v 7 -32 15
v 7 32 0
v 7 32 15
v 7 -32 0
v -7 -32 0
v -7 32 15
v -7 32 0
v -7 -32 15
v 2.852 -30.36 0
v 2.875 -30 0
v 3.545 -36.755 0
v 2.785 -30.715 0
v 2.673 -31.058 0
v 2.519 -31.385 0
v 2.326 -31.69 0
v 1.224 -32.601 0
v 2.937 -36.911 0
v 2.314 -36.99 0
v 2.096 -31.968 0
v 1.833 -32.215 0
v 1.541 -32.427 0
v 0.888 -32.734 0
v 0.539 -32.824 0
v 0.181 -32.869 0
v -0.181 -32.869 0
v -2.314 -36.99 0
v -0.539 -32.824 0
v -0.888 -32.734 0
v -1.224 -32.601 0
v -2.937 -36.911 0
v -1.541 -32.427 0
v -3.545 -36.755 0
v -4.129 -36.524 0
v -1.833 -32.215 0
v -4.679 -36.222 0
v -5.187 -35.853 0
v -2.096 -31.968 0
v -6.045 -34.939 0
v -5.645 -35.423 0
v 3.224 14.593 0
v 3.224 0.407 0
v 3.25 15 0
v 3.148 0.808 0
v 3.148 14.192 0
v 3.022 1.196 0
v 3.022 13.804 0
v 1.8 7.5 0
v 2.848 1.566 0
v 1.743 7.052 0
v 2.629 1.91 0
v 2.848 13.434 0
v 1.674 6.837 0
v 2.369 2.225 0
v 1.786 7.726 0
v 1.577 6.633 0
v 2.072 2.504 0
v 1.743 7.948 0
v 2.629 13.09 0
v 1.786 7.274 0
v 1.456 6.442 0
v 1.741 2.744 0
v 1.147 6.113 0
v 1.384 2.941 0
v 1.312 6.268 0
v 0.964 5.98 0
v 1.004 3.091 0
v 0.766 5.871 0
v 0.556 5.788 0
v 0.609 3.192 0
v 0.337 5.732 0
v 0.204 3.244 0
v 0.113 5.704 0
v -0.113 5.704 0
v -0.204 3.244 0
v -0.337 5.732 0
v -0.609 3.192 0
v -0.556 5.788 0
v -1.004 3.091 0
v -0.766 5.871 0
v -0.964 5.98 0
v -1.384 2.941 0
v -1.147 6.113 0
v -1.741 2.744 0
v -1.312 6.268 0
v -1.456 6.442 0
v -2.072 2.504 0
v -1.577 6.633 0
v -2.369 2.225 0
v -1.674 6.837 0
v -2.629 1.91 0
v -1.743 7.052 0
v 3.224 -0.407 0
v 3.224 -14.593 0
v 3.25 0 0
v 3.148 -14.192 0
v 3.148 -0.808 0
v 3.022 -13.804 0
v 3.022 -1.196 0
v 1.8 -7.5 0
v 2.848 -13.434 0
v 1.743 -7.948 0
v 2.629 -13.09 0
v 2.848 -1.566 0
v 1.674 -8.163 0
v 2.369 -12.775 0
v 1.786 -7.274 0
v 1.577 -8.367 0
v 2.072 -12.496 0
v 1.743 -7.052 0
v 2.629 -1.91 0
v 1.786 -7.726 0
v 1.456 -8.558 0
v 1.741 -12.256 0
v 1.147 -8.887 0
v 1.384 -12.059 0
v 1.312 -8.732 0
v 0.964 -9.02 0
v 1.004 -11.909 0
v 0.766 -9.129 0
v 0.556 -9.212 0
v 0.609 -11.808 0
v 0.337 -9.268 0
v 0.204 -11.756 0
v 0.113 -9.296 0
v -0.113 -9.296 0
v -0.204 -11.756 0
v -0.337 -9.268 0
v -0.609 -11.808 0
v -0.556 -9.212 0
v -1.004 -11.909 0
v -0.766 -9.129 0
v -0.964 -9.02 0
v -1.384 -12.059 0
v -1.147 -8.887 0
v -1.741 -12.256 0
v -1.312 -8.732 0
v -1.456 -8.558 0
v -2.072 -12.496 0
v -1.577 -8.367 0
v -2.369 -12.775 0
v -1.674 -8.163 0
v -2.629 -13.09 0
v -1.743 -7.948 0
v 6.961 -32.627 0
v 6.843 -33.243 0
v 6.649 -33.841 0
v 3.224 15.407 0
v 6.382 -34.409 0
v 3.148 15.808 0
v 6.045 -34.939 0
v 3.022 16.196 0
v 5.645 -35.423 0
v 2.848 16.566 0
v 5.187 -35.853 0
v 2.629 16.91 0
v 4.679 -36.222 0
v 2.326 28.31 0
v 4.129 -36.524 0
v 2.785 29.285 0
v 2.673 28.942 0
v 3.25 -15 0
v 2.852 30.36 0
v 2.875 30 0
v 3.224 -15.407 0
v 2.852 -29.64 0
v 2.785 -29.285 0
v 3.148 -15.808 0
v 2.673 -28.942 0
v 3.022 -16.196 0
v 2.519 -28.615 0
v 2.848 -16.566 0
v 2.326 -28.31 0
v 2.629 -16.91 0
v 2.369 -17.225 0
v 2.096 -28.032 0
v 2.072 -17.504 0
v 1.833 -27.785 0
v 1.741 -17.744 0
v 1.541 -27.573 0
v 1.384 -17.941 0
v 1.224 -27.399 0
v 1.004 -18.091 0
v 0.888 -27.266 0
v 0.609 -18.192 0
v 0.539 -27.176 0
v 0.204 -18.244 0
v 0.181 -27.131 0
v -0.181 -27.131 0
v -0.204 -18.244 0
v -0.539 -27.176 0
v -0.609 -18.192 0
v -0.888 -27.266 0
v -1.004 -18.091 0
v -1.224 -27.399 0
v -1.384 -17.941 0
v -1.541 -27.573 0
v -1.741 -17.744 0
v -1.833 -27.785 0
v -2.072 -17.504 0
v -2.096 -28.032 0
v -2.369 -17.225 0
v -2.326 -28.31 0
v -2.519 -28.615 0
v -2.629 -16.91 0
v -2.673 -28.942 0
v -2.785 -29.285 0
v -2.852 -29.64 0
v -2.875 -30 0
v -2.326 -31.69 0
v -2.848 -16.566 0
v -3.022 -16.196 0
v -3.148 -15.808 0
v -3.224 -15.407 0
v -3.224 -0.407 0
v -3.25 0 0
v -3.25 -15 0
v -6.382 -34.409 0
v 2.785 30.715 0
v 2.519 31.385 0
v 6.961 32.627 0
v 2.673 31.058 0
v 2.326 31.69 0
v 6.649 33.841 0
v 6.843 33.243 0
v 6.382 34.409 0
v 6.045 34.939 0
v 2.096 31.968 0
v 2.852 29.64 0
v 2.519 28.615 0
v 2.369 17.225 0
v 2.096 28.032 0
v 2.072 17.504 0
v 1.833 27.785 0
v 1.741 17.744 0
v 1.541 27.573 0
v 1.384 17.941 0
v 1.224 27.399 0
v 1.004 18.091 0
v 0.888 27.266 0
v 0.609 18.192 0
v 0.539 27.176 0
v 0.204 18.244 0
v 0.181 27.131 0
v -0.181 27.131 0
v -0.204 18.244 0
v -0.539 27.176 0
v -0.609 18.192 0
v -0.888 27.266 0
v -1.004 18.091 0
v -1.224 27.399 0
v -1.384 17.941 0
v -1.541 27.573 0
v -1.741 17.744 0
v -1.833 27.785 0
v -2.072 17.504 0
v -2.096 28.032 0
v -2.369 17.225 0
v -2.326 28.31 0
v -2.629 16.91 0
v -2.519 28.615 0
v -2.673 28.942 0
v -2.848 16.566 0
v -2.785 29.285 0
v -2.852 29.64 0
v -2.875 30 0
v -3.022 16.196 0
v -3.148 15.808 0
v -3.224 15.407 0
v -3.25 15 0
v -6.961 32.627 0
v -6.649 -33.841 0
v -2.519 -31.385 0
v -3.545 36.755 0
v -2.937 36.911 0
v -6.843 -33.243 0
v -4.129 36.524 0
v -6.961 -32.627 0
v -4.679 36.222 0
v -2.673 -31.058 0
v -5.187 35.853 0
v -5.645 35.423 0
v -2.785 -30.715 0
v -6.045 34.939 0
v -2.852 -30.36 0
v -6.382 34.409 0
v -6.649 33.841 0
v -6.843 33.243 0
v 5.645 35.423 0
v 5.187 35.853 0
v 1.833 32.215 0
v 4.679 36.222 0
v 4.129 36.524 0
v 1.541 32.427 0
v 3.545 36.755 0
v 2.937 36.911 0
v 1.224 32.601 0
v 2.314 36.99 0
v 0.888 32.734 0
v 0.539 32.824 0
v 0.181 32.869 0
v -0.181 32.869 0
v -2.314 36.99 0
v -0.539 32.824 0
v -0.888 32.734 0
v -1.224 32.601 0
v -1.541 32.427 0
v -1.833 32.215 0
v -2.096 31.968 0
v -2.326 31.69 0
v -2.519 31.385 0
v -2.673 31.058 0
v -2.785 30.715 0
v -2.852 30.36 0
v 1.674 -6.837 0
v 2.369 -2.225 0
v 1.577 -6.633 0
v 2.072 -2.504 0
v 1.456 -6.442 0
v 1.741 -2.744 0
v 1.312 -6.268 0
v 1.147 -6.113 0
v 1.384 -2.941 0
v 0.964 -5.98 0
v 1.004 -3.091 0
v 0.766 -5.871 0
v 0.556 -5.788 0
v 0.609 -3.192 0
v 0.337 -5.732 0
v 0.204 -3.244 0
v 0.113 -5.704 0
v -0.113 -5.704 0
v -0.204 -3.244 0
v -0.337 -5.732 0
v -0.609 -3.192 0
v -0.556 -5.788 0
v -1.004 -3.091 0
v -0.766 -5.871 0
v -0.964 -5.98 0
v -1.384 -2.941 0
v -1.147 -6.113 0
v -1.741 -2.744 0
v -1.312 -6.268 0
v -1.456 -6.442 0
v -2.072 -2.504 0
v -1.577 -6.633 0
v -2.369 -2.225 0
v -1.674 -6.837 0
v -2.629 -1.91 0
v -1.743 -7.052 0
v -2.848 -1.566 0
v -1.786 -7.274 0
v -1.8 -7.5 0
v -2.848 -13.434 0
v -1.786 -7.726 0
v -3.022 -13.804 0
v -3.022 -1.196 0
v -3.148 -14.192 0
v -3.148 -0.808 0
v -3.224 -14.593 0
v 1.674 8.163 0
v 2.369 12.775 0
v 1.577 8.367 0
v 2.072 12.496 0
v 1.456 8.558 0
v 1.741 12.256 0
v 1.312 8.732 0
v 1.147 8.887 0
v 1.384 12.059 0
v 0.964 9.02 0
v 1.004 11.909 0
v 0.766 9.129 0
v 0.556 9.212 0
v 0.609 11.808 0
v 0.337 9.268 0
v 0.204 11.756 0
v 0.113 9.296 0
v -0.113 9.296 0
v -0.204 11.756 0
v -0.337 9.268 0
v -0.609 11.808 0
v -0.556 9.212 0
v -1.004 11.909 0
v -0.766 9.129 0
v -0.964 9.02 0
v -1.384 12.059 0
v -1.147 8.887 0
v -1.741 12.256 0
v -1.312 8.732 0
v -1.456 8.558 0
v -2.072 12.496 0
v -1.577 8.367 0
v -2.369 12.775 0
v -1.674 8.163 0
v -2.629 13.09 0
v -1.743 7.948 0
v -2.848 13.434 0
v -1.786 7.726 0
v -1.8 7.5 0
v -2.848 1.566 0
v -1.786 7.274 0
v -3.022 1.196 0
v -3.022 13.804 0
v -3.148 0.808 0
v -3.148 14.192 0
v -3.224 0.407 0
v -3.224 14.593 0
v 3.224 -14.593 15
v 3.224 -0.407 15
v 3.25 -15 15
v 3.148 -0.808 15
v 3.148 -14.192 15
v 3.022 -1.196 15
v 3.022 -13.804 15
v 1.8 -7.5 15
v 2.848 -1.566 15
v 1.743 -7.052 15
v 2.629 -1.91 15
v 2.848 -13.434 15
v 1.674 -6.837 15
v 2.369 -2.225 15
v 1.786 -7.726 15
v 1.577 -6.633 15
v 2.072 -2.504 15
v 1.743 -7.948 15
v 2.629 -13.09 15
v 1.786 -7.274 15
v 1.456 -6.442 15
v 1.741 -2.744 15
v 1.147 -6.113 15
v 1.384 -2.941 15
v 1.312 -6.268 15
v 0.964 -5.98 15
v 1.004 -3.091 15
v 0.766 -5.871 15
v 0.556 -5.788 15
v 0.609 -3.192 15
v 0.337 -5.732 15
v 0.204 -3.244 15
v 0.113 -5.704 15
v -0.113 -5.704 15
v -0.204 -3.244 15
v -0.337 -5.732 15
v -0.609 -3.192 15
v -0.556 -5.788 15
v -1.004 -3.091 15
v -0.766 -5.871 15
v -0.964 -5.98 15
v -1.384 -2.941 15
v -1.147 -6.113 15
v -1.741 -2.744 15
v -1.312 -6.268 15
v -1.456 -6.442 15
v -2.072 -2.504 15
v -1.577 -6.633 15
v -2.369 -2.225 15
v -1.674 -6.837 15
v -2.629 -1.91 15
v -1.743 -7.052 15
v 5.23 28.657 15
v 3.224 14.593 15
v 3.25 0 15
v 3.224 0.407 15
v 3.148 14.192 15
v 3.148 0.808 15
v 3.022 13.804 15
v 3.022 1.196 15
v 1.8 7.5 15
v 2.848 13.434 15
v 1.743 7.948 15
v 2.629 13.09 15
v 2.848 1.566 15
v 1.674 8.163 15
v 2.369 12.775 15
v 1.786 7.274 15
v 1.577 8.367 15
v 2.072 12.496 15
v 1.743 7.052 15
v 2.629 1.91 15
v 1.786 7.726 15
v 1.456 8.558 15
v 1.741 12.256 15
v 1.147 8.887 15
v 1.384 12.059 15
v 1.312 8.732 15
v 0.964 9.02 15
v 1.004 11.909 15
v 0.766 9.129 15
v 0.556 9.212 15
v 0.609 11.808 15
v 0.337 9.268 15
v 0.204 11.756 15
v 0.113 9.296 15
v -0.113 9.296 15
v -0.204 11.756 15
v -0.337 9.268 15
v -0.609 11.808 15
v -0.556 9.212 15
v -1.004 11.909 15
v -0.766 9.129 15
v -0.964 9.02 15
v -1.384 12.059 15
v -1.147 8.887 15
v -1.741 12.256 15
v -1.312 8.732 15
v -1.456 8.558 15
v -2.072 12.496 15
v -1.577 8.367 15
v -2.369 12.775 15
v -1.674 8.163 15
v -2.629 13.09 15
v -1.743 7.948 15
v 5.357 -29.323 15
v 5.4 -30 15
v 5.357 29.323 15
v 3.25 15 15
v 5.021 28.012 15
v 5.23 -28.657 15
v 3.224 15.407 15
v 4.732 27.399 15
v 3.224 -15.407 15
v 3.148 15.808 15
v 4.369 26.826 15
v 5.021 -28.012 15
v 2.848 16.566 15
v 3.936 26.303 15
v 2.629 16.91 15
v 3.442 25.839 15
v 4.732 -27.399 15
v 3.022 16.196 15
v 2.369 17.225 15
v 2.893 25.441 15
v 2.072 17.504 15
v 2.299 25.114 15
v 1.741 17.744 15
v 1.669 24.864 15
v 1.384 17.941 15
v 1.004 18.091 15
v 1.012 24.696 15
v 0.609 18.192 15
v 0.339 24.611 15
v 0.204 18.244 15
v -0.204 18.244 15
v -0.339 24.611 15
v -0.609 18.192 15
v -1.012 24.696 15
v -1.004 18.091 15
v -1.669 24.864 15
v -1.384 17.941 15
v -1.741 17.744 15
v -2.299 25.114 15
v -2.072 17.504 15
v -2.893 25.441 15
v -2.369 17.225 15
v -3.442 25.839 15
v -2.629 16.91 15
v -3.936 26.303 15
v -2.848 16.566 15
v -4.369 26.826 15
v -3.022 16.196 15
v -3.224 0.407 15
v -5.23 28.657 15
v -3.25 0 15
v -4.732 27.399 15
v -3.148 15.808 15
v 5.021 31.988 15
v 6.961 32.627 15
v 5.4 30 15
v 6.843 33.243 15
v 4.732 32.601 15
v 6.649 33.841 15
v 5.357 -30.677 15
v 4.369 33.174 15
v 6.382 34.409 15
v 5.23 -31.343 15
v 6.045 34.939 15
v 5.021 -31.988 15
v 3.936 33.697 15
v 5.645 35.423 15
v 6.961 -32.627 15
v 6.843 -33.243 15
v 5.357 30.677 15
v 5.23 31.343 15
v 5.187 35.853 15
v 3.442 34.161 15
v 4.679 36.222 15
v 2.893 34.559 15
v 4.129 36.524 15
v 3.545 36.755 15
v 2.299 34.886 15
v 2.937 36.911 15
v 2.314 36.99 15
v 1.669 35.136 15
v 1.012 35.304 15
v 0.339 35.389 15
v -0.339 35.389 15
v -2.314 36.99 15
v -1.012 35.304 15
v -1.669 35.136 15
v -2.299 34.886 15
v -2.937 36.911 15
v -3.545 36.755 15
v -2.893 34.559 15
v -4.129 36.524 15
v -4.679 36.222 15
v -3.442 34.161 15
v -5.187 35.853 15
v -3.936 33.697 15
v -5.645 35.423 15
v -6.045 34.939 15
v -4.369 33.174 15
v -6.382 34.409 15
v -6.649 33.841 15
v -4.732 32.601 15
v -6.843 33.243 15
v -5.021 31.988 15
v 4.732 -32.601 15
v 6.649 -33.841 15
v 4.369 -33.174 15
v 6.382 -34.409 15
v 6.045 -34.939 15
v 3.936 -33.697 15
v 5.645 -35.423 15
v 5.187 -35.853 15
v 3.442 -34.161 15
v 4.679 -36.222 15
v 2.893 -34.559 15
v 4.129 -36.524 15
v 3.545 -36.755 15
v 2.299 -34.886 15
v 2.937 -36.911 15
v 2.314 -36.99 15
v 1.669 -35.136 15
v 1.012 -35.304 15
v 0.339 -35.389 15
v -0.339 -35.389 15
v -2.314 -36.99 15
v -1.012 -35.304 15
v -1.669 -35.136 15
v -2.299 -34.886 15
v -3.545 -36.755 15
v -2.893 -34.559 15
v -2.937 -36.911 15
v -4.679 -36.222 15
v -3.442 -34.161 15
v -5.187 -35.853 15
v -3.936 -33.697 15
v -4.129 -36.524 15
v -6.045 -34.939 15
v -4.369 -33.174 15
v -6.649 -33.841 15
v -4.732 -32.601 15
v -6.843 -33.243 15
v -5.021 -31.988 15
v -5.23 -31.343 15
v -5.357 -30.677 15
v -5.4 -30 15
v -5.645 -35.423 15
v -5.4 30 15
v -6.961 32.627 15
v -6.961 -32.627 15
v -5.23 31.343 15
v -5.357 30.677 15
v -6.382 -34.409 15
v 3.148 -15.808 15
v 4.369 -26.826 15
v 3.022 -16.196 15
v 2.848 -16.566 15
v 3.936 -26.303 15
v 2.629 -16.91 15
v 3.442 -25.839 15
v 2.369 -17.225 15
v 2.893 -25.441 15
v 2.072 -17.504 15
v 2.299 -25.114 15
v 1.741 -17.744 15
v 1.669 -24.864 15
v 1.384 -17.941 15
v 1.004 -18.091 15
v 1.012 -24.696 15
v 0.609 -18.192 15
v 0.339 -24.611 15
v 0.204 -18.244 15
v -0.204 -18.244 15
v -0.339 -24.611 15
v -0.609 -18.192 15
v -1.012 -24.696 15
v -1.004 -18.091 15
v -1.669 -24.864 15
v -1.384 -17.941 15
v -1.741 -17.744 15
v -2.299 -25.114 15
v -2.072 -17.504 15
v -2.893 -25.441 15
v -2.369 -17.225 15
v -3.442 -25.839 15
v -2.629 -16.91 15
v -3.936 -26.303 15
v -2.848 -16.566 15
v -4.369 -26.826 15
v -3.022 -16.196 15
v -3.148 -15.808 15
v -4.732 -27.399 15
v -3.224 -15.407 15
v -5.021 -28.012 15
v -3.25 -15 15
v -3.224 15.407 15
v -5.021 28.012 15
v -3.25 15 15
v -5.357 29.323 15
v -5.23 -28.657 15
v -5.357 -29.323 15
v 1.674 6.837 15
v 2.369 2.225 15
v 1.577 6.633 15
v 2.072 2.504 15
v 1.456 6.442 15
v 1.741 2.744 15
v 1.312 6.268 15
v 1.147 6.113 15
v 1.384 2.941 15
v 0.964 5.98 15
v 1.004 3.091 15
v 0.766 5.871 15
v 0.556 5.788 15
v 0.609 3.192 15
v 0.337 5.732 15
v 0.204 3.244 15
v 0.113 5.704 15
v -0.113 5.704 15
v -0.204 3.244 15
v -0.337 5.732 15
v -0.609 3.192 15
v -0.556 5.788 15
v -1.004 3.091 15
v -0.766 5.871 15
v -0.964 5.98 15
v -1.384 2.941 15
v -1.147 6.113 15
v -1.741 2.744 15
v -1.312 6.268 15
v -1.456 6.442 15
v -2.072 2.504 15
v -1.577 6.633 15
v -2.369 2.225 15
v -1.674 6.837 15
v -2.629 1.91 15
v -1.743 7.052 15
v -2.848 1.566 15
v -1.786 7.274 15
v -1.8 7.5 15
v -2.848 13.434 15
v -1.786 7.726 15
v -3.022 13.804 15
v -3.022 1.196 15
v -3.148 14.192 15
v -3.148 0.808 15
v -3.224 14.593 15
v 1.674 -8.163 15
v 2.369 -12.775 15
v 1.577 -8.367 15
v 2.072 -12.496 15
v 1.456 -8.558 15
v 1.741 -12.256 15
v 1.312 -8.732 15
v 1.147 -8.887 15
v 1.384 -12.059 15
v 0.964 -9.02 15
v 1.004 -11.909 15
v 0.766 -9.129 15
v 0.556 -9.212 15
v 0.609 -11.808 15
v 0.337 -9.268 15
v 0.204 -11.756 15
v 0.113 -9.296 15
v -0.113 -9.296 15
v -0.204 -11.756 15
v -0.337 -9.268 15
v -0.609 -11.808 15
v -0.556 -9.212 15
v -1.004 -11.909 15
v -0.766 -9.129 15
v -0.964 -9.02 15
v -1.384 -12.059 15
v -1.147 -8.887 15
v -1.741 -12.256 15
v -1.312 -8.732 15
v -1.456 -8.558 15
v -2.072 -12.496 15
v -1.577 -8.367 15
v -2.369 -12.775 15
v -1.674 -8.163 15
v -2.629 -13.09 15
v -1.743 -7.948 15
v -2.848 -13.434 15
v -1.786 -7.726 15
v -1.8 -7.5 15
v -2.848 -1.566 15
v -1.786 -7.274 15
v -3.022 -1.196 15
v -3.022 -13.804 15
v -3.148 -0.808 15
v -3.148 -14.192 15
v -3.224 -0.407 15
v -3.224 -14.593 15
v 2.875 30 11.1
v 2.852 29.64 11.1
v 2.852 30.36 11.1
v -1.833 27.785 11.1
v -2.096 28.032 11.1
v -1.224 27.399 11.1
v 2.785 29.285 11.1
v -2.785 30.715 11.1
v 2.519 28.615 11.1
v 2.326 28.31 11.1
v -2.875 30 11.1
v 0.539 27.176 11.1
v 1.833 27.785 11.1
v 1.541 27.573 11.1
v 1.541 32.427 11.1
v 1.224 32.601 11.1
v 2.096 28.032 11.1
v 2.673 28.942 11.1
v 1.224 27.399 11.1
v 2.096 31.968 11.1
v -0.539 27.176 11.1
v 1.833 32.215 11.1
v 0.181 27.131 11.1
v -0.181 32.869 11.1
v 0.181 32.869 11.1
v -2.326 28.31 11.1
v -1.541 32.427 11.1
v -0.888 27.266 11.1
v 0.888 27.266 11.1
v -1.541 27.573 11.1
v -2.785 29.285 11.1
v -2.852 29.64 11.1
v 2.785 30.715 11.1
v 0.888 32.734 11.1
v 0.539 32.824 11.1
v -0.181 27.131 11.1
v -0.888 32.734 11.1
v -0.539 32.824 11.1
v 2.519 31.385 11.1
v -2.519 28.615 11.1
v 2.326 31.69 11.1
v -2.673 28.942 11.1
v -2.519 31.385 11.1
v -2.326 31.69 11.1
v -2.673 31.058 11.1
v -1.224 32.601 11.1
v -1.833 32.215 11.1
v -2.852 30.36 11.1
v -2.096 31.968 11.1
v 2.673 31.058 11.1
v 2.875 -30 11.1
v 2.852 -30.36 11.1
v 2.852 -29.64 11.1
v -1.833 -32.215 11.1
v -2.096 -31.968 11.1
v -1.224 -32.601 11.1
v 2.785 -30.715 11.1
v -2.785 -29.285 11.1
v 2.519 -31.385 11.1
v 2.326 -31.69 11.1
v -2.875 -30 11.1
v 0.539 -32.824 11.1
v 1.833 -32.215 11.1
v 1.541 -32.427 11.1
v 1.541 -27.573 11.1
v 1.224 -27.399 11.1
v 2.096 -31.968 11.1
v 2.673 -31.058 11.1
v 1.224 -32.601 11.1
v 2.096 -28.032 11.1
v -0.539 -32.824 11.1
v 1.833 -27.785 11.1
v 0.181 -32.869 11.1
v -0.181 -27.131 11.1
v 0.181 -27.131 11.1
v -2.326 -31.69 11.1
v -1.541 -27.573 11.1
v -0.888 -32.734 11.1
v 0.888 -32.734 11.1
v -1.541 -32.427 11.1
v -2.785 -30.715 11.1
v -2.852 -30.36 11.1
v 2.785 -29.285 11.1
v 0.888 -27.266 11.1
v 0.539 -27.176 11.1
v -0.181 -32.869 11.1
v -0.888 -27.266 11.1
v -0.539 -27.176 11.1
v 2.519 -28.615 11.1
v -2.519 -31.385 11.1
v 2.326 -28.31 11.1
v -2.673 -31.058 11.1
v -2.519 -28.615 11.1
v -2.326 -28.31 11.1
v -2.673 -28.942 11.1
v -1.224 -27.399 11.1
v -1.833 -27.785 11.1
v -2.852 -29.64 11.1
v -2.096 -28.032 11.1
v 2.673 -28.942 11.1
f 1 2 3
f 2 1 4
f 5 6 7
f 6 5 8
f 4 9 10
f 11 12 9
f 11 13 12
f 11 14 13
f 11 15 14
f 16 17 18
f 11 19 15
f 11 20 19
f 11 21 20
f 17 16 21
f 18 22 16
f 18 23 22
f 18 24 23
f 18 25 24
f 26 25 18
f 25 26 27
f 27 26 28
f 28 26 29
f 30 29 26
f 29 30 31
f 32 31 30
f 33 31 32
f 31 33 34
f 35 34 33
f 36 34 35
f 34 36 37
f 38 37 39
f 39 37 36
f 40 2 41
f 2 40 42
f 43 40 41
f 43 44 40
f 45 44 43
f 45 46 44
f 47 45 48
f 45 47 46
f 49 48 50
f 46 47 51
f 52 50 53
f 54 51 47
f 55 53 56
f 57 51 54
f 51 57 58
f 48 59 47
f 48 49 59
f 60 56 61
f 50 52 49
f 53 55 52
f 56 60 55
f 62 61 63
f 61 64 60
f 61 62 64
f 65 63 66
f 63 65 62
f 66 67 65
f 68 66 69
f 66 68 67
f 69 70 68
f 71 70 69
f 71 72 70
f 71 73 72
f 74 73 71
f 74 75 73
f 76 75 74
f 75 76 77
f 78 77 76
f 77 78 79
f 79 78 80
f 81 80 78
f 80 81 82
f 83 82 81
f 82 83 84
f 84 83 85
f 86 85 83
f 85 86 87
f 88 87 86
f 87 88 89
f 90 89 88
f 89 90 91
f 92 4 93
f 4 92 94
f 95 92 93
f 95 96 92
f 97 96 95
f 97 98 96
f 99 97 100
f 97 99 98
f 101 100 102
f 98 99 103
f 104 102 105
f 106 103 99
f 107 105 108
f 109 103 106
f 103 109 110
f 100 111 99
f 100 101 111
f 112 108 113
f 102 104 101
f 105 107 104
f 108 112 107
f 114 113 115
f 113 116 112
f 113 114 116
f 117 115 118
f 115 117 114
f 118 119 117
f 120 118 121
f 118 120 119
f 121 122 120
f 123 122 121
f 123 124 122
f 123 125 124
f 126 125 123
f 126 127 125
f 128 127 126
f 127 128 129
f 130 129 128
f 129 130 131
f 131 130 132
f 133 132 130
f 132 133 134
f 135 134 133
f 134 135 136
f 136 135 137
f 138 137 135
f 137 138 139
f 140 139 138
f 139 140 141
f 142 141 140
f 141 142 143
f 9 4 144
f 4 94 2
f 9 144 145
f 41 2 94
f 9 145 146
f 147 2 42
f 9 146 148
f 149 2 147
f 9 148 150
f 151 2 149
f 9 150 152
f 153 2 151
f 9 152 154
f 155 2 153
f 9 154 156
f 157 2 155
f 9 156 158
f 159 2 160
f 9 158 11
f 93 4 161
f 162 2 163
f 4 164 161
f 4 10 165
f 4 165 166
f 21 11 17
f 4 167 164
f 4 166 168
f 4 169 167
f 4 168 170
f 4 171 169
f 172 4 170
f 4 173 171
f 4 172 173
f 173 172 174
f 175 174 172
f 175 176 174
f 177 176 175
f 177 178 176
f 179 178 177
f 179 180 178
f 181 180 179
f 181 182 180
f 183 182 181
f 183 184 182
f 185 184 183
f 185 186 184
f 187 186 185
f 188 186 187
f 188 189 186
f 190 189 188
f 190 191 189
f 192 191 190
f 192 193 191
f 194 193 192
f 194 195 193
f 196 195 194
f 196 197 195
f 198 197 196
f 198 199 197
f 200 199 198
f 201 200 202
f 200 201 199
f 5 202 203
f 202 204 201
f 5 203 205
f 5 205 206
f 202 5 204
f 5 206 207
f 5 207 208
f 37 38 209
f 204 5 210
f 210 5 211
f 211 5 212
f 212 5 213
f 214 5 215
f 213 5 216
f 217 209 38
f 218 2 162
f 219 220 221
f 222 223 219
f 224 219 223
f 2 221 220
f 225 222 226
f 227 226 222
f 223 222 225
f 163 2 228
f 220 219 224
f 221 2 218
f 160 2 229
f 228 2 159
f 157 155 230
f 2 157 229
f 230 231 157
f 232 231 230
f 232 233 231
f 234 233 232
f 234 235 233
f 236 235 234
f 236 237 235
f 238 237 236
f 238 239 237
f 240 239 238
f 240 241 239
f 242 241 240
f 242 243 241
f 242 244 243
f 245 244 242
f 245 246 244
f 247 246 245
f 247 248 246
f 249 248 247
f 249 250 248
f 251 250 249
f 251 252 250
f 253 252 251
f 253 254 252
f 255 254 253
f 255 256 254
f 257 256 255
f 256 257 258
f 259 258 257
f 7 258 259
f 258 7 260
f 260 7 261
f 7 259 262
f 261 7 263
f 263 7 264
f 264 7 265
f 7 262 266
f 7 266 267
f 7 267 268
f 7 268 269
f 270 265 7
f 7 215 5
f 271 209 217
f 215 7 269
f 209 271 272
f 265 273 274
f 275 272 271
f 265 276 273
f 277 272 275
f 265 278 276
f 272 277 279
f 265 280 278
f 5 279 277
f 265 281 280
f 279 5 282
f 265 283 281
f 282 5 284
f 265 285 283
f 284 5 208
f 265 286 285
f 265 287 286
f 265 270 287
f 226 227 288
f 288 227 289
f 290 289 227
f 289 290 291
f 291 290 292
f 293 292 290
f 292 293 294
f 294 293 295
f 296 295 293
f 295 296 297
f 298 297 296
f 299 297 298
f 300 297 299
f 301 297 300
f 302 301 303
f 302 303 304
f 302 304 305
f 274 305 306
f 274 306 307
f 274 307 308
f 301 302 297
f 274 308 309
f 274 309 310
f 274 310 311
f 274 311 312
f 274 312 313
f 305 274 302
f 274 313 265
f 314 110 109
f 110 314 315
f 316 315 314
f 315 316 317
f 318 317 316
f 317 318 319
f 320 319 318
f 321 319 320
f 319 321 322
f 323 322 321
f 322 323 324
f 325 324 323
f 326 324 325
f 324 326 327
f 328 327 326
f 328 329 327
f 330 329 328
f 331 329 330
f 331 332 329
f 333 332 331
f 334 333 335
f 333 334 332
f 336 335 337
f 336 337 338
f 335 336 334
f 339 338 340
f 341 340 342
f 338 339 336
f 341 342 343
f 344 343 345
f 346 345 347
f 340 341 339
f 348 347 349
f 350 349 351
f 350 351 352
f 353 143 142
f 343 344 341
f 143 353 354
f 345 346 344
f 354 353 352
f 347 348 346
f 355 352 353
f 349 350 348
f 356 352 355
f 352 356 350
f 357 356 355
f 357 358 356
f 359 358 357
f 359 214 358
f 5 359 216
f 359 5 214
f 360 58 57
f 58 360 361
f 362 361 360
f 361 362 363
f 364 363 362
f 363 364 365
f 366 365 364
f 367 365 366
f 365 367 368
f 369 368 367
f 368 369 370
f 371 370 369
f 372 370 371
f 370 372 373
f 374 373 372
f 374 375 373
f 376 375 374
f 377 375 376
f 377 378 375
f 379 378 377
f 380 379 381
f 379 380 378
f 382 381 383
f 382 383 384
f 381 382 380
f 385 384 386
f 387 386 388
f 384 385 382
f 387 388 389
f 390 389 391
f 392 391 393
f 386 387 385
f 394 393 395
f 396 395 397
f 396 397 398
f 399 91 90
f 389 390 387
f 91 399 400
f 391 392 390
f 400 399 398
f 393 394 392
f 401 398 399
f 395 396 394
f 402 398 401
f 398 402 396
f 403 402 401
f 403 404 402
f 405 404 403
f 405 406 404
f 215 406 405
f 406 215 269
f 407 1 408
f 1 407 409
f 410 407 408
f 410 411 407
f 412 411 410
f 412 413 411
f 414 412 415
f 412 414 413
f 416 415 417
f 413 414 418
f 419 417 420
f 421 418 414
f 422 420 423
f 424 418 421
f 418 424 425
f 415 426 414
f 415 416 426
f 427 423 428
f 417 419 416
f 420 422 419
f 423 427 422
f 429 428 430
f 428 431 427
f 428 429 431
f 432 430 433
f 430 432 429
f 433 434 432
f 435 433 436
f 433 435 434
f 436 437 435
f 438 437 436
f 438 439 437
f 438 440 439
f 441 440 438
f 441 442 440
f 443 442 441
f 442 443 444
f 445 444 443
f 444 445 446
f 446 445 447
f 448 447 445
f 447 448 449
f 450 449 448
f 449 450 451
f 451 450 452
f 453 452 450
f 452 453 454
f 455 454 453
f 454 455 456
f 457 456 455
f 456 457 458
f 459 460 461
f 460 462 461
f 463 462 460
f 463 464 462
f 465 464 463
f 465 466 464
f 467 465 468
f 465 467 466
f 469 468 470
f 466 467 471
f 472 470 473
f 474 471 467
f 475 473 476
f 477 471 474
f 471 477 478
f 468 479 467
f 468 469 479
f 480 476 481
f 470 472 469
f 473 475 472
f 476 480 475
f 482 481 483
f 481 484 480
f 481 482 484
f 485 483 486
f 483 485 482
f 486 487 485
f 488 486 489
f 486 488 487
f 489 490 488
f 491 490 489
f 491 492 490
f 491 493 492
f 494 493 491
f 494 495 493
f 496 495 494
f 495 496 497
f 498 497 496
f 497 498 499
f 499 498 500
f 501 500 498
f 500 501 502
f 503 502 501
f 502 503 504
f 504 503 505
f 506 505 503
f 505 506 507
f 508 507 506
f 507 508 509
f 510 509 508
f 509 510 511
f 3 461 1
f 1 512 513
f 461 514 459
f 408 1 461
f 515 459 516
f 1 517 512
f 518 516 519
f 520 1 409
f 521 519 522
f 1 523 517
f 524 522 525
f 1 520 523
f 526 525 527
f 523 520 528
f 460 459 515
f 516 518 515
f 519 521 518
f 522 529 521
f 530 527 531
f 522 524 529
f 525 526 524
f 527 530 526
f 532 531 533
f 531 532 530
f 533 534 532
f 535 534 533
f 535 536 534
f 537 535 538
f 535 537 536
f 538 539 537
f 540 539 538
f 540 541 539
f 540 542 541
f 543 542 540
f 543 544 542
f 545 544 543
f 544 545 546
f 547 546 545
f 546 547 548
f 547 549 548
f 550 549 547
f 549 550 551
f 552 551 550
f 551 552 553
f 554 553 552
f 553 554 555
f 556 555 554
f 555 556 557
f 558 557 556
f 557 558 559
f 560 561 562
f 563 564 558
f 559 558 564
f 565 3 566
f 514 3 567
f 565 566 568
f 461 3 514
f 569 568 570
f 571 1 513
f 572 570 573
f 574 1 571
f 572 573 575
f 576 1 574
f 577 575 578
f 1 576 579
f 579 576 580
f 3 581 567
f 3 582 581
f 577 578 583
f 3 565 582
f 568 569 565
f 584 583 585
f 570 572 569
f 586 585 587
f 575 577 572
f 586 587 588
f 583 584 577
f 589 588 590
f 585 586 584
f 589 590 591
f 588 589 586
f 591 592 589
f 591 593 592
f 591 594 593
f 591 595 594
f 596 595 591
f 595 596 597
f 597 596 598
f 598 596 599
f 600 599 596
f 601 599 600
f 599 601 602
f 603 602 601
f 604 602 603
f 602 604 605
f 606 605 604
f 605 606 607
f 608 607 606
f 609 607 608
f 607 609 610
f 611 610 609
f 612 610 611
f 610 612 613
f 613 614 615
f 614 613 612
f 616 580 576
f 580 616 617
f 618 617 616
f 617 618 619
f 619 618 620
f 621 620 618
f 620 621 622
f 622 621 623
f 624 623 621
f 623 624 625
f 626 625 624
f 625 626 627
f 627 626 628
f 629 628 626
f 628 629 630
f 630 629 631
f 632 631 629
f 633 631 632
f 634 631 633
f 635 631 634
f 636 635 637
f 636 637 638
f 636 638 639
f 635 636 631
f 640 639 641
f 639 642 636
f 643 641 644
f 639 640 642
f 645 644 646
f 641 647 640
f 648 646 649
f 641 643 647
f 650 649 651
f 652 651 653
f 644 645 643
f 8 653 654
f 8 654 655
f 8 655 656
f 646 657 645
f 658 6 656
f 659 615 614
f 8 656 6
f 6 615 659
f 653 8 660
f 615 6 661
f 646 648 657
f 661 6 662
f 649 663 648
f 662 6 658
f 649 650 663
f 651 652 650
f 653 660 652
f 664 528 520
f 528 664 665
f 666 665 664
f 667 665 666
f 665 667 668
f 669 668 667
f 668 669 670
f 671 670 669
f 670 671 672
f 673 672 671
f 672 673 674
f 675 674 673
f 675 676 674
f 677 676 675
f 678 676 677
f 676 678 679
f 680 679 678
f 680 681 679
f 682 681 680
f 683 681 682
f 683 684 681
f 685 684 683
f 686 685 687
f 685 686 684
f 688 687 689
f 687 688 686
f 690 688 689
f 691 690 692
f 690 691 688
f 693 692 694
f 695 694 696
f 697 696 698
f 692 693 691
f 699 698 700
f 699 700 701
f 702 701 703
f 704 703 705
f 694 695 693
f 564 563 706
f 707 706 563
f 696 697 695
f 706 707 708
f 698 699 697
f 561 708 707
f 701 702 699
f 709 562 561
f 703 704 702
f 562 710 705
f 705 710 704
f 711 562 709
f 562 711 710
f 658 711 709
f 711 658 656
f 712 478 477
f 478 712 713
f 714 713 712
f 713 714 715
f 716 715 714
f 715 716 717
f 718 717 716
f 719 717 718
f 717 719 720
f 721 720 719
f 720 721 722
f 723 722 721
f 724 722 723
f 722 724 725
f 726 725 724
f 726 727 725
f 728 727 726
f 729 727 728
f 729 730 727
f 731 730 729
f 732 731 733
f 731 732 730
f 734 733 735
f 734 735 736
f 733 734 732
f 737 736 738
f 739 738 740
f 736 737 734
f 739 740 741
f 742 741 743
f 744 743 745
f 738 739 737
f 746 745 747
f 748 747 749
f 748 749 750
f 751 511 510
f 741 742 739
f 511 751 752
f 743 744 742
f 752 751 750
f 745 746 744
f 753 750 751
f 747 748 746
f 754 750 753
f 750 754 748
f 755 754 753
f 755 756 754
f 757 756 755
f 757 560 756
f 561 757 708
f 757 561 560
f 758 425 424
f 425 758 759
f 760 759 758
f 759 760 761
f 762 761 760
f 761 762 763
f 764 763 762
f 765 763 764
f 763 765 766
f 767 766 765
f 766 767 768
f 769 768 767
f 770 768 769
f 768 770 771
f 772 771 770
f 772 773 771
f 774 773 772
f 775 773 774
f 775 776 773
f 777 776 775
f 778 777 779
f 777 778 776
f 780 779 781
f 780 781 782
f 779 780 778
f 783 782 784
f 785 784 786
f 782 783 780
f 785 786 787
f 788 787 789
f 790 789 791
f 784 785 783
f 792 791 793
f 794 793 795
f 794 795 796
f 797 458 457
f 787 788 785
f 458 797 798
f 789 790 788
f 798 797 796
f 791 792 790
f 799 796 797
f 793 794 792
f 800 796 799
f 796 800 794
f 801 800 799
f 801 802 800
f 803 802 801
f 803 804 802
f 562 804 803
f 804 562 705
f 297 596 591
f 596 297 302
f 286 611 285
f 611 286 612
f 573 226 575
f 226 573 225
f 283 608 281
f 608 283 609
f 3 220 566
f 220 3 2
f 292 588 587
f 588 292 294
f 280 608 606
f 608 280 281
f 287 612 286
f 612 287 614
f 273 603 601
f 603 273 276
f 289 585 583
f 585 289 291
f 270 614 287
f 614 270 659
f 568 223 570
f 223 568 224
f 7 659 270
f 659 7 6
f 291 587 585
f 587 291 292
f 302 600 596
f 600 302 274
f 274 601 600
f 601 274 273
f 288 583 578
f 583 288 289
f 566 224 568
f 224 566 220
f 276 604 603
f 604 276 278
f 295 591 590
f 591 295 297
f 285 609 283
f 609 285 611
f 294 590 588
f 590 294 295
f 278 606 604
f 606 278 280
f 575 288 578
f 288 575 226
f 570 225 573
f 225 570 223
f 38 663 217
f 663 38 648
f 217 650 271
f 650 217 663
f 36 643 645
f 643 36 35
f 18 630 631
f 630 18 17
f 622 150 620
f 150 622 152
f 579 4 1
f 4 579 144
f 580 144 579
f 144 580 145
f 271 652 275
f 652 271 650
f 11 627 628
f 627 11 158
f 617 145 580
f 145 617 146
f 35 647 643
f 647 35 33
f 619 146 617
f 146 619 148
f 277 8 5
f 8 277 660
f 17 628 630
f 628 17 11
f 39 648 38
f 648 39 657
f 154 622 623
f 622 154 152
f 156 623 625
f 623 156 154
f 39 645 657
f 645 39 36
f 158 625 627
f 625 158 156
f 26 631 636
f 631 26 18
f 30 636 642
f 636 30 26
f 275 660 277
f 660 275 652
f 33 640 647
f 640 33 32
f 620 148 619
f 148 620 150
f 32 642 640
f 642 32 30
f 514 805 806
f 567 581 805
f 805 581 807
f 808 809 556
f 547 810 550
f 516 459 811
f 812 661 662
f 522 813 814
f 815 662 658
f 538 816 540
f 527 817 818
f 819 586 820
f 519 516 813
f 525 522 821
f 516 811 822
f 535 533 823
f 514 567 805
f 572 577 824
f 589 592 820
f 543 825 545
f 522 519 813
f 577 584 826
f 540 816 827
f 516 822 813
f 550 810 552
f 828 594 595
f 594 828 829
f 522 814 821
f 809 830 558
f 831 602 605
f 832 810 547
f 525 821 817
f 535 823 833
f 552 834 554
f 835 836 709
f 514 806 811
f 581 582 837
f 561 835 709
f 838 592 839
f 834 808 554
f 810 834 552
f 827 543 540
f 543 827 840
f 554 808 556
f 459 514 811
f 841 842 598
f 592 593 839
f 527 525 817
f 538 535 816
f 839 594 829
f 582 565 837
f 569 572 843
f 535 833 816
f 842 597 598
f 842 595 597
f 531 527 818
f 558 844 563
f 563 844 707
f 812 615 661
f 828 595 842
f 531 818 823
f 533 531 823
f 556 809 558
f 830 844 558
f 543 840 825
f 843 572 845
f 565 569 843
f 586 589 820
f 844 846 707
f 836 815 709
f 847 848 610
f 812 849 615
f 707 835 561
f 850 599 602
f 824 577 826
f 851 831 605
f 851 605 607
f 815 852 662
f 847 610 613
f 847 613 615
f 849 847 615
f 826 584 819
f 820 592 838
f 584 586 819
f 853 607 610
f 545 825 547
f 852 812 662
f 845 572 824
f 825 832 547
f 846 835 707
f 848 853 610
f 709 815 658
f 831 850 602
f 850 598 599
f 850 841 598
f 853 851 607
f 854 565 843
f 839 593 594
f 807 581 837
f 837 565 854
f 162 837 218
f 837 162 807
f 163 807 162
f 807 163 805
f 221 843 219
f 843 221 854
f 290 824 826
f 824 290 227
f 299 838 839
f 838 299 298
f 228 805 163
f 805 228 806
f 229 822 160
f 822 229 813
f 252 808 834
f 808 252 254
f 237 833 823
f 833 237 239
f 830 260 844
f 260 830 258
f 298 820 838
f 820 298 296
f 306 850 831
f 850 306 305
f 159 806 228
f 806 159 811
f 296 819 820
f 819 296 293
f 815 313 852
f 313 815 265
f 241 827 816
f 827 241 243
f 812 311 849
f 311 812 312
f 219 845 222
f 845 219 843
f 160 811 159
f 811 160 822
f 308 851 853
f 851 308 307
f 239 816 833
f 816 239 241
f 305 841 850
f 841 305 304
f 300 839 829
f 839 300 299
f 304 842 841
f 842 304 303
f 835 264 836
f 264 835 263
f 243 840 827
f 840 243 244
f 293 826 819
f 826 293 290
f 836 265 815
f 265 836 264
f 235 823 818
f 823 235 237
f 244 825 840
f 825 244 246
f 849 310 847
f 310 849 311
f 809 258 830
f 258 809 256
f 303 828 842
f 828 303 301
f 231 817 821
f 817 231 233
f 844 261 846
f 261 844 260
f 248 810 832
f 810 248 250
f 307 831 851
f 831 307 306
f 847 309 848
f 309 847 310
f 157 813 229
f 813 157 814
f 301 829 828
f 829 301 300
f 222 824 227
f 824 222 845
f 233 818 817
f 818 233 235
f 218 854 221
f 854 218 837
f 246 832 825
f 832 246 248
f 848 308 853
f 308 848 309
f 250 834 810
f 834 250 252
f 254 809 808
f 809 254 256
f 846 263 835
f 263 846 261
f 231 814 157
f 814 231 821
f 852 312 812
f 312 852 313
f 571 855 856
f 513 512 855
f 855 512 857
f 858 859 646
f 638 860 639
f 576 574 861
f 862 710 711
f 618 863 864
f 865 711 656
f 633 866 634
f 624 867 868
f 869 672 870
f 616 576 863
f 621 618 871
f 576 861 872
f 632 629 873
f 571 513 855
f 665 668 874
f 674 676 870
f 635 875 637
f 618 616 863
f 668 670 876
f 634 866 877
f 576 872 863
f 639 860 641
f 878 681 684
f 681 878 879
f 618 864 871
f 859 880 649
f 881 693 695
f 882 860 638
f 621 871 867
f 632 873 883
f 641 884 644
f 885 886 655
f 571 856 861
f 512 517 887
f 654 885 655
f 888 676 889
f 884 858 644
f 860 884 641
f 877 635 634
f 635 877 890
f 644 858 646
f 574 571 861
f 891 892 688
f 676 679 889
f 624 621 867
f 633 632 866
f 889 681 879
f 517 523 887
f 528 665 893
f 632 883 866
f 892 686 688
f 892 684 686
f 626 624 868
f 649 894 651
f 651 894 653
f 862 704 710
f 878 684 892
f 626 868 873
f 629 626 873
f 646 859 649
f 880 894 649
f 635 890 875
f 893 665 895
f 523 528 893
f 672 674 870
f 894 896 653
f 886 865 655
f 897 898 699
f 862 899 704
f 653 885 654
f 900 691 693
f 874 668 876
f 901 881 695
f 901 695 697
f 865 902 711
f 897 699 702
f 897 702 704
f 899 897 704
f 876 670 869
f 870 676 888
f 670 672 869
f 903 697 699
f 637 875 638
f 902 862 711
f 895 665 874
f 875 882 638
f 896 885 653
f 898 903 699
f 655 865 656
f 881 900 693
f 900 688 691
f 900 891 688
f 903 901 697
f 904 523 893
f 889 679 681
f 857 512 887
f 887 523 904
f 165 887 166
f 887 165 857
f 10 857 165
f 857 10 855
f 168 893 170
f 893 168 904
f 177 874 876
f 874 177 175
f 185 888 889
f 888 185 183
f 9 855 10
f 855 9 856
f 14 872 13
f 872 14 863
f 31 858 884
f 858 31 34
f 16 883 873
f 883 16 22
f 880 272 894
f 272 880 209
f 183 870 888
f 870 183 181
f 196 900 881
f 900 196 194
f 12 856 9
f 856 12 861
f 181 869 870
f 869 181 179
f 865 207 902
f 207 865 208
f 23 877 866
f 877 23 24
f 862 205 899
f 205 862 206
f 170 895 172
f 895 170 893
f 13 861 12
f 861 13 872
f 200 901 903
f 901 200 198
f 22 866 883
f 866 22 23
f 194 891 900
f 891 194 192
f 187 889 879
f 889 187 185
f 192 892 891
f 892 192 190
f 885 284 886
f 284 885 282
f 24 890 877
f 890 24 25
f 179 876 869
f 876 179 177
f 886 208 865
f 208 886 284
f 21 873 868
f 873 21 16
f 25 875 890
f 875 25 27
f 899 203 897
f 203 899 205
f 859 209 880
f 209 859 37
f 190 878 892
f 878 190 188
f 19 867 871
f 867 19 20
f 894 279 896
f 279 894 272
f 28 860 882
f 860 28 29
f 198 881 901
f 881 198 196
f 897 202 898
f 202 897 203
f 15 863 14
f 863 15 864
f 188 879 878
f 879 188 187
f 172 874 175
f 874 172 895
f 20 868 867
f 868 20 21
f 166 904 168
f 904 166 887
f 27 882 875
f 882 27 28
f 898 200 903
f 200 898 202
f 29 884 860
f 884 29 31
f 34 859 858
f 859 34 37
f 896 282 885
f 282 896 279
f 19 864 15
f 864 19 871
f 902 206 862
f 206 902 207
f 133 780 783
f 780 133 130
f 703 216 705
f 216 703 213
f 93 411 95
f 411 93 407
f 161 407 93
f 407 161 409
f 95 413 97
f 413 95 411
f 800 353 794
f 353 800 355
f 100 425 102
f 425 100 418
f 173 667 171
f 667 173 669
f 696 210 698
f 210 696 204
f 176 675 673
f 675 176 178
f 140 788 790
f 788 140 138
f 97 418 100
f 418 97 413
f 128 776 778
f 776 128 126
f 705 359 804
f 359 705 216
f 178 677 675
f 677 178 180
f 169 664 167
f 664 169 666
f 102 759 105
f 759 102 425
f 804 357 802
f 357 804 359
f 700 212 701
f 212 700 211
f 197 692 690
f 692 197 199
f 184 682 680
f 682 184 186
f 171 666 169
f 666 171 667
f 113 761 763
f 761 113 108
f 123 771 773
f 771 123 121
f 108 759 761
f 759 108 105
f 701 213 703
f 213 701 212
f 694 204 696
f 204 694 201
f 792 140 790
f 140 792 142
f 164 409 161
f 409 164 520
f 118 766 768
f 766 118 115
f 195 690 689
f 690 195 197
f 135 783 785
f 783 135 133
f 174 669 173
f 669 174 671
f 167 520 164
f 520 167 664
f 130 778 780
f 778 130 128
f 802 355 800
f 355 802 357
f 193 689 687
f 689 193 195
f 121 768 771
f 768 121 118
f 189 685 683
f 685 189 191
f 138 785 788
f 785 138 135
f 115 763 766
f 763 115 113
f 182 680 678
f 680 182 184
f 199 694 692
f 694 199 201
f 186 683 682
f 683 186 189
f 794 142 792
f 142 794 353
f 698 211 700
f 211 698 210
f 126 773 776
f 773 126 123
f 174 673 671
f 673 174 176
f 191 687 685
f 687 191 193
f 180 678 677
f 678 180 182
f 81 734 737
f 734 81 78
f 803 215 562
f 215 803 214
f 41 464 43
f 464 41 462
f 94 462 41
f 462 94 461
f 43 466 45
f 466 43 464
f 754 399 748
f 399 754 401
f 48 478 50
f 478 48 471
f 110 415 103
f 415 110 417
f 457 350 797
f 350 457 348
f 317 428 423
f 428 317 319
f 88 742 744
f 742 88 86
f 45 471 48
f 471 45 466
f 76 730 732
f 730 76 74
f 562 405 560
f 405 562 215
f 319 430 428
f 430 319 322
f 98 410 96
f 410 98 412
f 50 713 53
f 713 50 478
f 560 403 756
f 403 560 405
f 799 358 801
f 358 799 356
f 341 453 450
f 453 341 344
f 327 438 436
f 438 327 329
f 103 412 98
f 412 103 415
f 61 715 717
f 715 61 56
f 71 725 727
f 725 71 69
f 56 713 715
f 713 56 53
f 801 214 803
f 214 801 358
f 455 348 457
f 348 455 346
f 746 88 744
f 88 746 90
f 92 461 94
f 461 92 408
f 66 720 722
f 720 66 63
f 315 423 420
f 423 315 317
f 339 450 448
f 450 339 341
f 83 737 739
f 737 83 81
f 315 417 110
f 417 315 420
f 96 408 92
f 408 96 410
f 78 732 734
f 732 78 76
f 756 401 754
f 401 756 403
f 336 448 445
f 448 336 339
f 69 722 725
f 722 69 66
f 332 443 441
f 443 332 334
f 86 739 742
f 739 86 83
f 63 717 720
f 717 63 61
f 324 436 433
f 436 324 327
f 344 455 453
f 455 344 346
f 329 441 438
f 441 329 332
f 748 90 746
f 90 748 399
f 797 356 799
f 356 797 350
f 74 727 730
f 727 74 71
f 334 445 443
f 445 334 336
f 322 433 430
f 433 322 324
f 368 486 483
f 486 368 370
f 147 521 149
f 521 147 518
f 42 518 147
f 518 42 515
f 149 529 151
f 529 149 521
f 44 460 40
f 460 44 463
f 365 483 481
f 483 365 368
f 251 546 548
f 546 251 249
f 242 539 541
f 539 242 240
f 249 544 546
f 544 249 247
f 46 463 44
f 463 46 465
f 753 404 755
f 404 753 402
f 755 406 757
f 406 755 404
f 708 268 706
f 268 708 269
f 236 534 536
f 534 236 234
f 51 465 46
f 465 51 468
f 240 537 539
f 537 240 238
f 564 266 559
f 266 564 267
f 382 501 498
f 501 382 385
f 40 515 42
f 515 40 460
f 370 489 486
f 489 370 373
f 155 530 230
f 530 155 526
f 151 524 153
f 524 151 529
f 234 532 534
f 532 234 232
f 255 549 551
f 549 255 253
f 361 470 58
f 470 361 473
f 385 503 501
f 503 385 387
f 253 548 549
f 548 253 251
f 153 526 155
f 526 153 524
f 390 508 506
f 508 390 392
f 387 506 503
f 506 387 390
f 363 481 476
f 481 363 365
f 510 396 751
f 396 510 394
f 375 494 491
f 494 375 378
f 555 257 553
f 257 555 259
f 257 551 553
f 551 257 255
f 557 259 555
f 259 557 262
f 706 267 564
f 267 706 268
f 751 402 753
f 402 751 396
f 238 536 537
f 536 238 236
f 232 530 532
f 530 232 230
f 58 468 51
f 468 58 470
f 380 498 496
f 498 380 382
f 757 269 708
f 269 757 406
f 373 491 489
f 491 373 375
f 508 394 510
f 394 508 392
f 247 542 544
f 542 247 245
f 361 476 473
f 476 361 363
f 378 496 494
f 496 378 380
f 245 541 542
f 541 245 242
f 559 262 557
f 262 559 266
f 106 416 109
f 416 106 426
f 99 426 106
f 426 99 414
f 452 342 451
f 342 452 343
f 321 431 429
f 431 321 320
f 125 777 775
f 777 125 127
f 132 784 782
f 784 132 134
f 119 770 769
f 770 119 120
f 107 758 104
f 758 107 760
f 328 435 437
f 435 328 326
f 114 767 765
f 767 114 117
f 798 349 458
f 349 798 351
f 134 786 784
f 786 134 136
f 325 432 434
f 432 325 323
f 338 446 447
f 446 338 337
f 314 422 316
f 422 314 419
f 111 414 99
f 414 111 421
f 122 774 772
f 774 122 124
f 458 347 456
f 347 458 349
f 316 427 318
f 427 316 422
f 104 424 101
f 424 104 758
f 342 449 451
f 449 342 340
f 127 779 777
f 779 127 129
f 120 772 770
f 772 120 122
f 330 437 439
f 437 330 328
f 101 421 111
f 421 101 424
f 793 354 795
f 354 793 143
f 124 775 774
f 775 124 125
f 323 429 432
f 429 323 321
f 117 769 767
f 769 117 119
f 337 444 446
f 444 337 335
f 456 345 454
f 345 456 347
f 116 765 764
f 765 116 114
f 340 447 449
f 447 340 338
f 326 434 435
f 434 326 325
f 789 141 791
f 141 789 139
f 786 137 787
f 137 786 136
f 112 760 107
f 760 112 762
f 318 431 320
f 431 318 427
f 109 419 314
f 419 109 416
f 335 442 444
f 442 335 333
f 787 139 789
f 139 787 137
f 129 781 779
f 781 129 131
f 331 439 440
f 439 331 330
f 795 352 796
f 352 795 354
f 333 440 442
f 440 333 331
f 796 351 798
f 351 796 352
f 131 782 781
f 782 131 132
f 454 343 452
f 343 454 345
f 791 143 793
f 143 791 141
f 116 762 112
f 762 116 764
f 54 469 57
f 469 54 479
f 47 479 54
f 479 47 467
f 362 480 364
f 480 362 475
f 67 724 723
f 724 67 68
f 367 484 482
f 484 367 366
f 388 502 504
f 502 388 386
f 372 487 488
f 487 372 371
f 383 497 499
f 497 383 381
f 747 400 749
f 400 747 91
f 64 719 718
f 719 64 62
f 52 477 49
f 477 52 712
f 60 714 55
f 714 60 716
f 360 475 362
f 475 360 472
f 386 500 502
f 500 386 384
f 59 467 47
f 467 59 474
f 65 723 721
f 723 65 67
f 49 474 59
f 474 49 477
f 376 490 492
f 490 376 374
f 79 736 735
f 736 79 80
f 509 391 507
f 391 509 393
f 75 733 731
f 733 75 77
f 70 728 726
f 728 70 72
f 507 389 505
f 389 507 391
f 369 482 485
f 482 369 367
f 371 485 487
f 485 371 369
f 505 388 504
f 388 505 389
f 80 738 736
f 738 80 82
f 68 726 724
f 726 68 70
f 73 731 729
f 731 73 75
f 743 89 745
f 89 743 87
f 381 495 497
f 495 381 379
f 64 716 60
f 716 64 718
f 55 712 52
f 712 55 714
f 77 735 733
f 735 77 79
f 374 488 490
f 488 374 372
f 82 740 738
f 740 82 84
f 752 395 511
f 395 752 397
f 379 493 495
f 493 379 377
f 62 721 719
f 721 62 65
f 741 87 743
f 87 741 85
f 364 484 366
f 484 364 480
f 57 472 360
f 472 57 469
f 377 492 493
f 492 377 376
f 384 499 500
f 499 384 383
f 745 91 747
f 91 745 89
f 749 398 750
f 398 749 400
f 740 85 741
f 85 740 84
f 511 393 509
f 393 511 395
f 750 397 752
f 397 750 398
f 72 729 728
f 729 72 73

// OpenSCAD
$fn = 50;


difference() {
	union() {
		hull() {
			translate(v = [-2.0000000000, 17.0000000000, 0]) {
				cylinder(h = 15, r = 5);
			}
			translate(v = [2.0000000000, 17.0000000000, 0]) {
				cylinder(h = 15, r = 5);
			}
			translate(v = [-2.0000000000, -17.0000000000, 0]) {
				cylinder(h = 15, r = 5);
			}
			translate(v = [2.0000000000, -17.0000000000, 0]) {
				cylinder(h = 15, r = 5);
			}
		}
		translate(v = [0.0000000000, 22.5000000000, 0]) {
			hull() {
				translate(v = [-2.0000000000, 9.5000000000, 0]) {
					cylinder(h = 15, r = 5);
				}
				translate(v = [2.0000000000, 9.5000000000, 0]) {
					cylinder(h = 15, r = 5);
				}
				translate(v = [-2.0000000000, -9.5000000000, 0]) {
					cylinder(h = 15, r = 5);
				}
				translate(v = [2.0000000000, -9.5000000000, 0]) {
					cylinder(h = 15, r = 5);
				}
			}
		}
		translate(v = [0.0000000000, 22.5000000000, 0]) {
			hull() {
				translate(v = [-2.0000000000, 9.5000000000, 0]) {
					cylinder(h = 15, r = 5);
				}
				translate(v = [2.0000000000, 9.5000000000, 0]) {
					cylinder(h = 15, r = 5);
				}
				translate(v = [-2.0000000000, -9.5000000000, 0]) {
					cylinder(h = 15, r = 5);
				}
				translate(v = [2.0000000000, -9.5000000000, 0]) {
					cylinder(h = 15, r = 5);
				}
			}
		}
		translate(v = [0.0000000000, -22.5000000000, 0]) {
			hull() {
				translate(v = [-2.0000000000, 9.5000000000, 0]) {
					cylinder(h = 15, r = 5);
				}
				translate(v = [2.0000000000, 9.5000000000, 0]) {
					cylinder(h = 15, r = 5);
				}
				translate(v = [-2.0000000000, -9.5000000000, 0]) {
					cylinder(h = 15, r = 5);
				}
				translate(v = [2.0000000000, -9.5000000000, 0]) {
					cylinder(h = 15, r = 5);
				}
			}
		}
		translate(v = [0.0000000000, -22.5000000000, 0]) {
			hull() {
				translate(v = [-2.0000000000, 9.5000000000, 0]) {
					cylinder(h = 15, r = 5);
				}
				translate(v = [2.0000000000, 9.5000000000, 0]) {
					cylinder(h = 15, r = 5);
				}
				translate(v = [-2.0000000000, -9.5000000000, 0]) {
					cylinder(h = 15, r = 5);
				}
				translate(v = [2.0000000000, -9.5000000000, 0]) {
					cylinder(h = 15, r = 5);
				}
			}
		}
	}
	union() {
		translate(v = [0.0000000000, 30.0000000000, 15]) {
			rotate(a = [0, 0, 0]) {
				difference() {
					union() {
						#translate(v = [0, 0, -15.0000000000]) {
							cylinder(h = 15, r = 2.6000000000);
						}
						#translate(v = [0, 0, -3.9000000000]) {
							cylinder(h = 3.9000000000, r1 = 2.8750000000, r2 = 5.4000000000);
						}
						#translate(v = [0, 0, -15.0000000000]) {
							cylinder(h = 15, r = 2.8750000000);
						}
						#translate(v = [0, 0, -15.0000000000]) {
							cylinder(h = 15, r = 2.6000000000);
						}
					}
					union();
				}
			}
		}
		translate(v = [0.0000000000, 30.0000000000, 15]) {
			rotate(a = [0, 0, 0]) {
				difference() {
					union() {
						#translate(v = [0, 0, -15.0000000000]) {
							cylinder(h = 15, r = 2.6000000000);
						}
						#translate(v = [0, 0, -3.9000000000]) {
							cylinder(h = 3.9000000000, r1 = 2.8750000000, r2 = 5.4000000000);
						}
						#translate(v = [0, 0, -15.0000000000]) {
							cylinder(h = 15, r = 2.8750000000);
						}
						#translate(v = [0, 0, -15.0000000000]) {
							cylinder(h = 15, r = 2.6000000000);
						}
					}
					union();
				}
			}
		}
		translate(v = [0.0000000000, -30.0000000000, 15]) {
			rotate(a = [0, 0, 0]) {
				difference() {
					union() {
						#translate(v = [0, 0, -15.0000000000]) {
							cylinder(h = 15, r = 2.6000000000);
						}
						#translate(v = [0, 0, -3.9000000000]) {
							cylinder(h = 3.9000000000, r1 = 2.8750000000, r2 = 5.4000000000);
						}
						#translate(v = [0, 0, -15.0000000000]) {
							cylinder(h = 15, r = 2.8750000000);
						}
						#translate(v = [0, 0, -15.0000000000]) {
							cylinder(h = 15, r = 2.6000000000);
						}
					}
					union();
				}
			}
		}
		translate(v = [0.0000000000, -30.0000000000, 15]) {
			rotate(a = [0, 0, 0]) {
				difference() {
					union() {
						#translate(v = [0, 0, -15.0000000000]) {
							cylinder(h = 15, r = 2.6000000000);
						}
						#translate(v = [0, 0, -3.9000000000]) {
							cylinder(h = 3.9000000000, r1 = 2.8750000000, r2 = 5.4000000000);
						}
						#translate(v = [0, 0, -15.0000000000]) {
							cylinder(h = 15, r = 2.8750000000);
						}
						#translate(v = [0, 0, -15.0000000000]) {
							cylinder(h = 15, r = 2.6000000000);
						}
					}
					union();
				}
			}
		}
		translate(v = [0.0000000000, -15.0000000000, 0]) {
			translate(v = [0, 0, -100]) {
				cylinder(h = 200, r = 3.2500000000);
			}
		}
		translate(v = [0, 0, -100]) {
			cylinder(h = 200, r = 3.2500000000);
		}
		translate(v = [0.0000000000, 15.0000000000, 0]) {
			translate(v = [0, 0, -100]) {
				cylinder(h = 200, r = 3.2500000000);
			}
		}
		translate(v = [0.0000000000, -15.0000000000, 0]) {
			translate(v = [0, 0, -100]) {
				cylinder(h = 200, r = 1.8000000000);
			}
		}
		translate(v = [0.0000000000, -7.5000000000, 0]) {
			translate(v = [0, 0, -100]) {
				cylinder(h = 200, r = 1.8000000000);
			}
		}
		translate(v = [0, 0, -100]) {
			cylinder(h = 200, r = 1.8000000000);
		}
		translate(v = [0.0000000000, 7.5000000000, 0]) {
			translate(v = [0, 0, -100]) {
				cylinder(h = 200, r = 1.8000000000);
			}
		}
		translate(v = [0.0000000000, 15.0000000000, 0]) {
			translate(v = [0, 0, -100]) {
				cylinder(h = 200, r = 1.8000000000);
			}
		}
	}
}
